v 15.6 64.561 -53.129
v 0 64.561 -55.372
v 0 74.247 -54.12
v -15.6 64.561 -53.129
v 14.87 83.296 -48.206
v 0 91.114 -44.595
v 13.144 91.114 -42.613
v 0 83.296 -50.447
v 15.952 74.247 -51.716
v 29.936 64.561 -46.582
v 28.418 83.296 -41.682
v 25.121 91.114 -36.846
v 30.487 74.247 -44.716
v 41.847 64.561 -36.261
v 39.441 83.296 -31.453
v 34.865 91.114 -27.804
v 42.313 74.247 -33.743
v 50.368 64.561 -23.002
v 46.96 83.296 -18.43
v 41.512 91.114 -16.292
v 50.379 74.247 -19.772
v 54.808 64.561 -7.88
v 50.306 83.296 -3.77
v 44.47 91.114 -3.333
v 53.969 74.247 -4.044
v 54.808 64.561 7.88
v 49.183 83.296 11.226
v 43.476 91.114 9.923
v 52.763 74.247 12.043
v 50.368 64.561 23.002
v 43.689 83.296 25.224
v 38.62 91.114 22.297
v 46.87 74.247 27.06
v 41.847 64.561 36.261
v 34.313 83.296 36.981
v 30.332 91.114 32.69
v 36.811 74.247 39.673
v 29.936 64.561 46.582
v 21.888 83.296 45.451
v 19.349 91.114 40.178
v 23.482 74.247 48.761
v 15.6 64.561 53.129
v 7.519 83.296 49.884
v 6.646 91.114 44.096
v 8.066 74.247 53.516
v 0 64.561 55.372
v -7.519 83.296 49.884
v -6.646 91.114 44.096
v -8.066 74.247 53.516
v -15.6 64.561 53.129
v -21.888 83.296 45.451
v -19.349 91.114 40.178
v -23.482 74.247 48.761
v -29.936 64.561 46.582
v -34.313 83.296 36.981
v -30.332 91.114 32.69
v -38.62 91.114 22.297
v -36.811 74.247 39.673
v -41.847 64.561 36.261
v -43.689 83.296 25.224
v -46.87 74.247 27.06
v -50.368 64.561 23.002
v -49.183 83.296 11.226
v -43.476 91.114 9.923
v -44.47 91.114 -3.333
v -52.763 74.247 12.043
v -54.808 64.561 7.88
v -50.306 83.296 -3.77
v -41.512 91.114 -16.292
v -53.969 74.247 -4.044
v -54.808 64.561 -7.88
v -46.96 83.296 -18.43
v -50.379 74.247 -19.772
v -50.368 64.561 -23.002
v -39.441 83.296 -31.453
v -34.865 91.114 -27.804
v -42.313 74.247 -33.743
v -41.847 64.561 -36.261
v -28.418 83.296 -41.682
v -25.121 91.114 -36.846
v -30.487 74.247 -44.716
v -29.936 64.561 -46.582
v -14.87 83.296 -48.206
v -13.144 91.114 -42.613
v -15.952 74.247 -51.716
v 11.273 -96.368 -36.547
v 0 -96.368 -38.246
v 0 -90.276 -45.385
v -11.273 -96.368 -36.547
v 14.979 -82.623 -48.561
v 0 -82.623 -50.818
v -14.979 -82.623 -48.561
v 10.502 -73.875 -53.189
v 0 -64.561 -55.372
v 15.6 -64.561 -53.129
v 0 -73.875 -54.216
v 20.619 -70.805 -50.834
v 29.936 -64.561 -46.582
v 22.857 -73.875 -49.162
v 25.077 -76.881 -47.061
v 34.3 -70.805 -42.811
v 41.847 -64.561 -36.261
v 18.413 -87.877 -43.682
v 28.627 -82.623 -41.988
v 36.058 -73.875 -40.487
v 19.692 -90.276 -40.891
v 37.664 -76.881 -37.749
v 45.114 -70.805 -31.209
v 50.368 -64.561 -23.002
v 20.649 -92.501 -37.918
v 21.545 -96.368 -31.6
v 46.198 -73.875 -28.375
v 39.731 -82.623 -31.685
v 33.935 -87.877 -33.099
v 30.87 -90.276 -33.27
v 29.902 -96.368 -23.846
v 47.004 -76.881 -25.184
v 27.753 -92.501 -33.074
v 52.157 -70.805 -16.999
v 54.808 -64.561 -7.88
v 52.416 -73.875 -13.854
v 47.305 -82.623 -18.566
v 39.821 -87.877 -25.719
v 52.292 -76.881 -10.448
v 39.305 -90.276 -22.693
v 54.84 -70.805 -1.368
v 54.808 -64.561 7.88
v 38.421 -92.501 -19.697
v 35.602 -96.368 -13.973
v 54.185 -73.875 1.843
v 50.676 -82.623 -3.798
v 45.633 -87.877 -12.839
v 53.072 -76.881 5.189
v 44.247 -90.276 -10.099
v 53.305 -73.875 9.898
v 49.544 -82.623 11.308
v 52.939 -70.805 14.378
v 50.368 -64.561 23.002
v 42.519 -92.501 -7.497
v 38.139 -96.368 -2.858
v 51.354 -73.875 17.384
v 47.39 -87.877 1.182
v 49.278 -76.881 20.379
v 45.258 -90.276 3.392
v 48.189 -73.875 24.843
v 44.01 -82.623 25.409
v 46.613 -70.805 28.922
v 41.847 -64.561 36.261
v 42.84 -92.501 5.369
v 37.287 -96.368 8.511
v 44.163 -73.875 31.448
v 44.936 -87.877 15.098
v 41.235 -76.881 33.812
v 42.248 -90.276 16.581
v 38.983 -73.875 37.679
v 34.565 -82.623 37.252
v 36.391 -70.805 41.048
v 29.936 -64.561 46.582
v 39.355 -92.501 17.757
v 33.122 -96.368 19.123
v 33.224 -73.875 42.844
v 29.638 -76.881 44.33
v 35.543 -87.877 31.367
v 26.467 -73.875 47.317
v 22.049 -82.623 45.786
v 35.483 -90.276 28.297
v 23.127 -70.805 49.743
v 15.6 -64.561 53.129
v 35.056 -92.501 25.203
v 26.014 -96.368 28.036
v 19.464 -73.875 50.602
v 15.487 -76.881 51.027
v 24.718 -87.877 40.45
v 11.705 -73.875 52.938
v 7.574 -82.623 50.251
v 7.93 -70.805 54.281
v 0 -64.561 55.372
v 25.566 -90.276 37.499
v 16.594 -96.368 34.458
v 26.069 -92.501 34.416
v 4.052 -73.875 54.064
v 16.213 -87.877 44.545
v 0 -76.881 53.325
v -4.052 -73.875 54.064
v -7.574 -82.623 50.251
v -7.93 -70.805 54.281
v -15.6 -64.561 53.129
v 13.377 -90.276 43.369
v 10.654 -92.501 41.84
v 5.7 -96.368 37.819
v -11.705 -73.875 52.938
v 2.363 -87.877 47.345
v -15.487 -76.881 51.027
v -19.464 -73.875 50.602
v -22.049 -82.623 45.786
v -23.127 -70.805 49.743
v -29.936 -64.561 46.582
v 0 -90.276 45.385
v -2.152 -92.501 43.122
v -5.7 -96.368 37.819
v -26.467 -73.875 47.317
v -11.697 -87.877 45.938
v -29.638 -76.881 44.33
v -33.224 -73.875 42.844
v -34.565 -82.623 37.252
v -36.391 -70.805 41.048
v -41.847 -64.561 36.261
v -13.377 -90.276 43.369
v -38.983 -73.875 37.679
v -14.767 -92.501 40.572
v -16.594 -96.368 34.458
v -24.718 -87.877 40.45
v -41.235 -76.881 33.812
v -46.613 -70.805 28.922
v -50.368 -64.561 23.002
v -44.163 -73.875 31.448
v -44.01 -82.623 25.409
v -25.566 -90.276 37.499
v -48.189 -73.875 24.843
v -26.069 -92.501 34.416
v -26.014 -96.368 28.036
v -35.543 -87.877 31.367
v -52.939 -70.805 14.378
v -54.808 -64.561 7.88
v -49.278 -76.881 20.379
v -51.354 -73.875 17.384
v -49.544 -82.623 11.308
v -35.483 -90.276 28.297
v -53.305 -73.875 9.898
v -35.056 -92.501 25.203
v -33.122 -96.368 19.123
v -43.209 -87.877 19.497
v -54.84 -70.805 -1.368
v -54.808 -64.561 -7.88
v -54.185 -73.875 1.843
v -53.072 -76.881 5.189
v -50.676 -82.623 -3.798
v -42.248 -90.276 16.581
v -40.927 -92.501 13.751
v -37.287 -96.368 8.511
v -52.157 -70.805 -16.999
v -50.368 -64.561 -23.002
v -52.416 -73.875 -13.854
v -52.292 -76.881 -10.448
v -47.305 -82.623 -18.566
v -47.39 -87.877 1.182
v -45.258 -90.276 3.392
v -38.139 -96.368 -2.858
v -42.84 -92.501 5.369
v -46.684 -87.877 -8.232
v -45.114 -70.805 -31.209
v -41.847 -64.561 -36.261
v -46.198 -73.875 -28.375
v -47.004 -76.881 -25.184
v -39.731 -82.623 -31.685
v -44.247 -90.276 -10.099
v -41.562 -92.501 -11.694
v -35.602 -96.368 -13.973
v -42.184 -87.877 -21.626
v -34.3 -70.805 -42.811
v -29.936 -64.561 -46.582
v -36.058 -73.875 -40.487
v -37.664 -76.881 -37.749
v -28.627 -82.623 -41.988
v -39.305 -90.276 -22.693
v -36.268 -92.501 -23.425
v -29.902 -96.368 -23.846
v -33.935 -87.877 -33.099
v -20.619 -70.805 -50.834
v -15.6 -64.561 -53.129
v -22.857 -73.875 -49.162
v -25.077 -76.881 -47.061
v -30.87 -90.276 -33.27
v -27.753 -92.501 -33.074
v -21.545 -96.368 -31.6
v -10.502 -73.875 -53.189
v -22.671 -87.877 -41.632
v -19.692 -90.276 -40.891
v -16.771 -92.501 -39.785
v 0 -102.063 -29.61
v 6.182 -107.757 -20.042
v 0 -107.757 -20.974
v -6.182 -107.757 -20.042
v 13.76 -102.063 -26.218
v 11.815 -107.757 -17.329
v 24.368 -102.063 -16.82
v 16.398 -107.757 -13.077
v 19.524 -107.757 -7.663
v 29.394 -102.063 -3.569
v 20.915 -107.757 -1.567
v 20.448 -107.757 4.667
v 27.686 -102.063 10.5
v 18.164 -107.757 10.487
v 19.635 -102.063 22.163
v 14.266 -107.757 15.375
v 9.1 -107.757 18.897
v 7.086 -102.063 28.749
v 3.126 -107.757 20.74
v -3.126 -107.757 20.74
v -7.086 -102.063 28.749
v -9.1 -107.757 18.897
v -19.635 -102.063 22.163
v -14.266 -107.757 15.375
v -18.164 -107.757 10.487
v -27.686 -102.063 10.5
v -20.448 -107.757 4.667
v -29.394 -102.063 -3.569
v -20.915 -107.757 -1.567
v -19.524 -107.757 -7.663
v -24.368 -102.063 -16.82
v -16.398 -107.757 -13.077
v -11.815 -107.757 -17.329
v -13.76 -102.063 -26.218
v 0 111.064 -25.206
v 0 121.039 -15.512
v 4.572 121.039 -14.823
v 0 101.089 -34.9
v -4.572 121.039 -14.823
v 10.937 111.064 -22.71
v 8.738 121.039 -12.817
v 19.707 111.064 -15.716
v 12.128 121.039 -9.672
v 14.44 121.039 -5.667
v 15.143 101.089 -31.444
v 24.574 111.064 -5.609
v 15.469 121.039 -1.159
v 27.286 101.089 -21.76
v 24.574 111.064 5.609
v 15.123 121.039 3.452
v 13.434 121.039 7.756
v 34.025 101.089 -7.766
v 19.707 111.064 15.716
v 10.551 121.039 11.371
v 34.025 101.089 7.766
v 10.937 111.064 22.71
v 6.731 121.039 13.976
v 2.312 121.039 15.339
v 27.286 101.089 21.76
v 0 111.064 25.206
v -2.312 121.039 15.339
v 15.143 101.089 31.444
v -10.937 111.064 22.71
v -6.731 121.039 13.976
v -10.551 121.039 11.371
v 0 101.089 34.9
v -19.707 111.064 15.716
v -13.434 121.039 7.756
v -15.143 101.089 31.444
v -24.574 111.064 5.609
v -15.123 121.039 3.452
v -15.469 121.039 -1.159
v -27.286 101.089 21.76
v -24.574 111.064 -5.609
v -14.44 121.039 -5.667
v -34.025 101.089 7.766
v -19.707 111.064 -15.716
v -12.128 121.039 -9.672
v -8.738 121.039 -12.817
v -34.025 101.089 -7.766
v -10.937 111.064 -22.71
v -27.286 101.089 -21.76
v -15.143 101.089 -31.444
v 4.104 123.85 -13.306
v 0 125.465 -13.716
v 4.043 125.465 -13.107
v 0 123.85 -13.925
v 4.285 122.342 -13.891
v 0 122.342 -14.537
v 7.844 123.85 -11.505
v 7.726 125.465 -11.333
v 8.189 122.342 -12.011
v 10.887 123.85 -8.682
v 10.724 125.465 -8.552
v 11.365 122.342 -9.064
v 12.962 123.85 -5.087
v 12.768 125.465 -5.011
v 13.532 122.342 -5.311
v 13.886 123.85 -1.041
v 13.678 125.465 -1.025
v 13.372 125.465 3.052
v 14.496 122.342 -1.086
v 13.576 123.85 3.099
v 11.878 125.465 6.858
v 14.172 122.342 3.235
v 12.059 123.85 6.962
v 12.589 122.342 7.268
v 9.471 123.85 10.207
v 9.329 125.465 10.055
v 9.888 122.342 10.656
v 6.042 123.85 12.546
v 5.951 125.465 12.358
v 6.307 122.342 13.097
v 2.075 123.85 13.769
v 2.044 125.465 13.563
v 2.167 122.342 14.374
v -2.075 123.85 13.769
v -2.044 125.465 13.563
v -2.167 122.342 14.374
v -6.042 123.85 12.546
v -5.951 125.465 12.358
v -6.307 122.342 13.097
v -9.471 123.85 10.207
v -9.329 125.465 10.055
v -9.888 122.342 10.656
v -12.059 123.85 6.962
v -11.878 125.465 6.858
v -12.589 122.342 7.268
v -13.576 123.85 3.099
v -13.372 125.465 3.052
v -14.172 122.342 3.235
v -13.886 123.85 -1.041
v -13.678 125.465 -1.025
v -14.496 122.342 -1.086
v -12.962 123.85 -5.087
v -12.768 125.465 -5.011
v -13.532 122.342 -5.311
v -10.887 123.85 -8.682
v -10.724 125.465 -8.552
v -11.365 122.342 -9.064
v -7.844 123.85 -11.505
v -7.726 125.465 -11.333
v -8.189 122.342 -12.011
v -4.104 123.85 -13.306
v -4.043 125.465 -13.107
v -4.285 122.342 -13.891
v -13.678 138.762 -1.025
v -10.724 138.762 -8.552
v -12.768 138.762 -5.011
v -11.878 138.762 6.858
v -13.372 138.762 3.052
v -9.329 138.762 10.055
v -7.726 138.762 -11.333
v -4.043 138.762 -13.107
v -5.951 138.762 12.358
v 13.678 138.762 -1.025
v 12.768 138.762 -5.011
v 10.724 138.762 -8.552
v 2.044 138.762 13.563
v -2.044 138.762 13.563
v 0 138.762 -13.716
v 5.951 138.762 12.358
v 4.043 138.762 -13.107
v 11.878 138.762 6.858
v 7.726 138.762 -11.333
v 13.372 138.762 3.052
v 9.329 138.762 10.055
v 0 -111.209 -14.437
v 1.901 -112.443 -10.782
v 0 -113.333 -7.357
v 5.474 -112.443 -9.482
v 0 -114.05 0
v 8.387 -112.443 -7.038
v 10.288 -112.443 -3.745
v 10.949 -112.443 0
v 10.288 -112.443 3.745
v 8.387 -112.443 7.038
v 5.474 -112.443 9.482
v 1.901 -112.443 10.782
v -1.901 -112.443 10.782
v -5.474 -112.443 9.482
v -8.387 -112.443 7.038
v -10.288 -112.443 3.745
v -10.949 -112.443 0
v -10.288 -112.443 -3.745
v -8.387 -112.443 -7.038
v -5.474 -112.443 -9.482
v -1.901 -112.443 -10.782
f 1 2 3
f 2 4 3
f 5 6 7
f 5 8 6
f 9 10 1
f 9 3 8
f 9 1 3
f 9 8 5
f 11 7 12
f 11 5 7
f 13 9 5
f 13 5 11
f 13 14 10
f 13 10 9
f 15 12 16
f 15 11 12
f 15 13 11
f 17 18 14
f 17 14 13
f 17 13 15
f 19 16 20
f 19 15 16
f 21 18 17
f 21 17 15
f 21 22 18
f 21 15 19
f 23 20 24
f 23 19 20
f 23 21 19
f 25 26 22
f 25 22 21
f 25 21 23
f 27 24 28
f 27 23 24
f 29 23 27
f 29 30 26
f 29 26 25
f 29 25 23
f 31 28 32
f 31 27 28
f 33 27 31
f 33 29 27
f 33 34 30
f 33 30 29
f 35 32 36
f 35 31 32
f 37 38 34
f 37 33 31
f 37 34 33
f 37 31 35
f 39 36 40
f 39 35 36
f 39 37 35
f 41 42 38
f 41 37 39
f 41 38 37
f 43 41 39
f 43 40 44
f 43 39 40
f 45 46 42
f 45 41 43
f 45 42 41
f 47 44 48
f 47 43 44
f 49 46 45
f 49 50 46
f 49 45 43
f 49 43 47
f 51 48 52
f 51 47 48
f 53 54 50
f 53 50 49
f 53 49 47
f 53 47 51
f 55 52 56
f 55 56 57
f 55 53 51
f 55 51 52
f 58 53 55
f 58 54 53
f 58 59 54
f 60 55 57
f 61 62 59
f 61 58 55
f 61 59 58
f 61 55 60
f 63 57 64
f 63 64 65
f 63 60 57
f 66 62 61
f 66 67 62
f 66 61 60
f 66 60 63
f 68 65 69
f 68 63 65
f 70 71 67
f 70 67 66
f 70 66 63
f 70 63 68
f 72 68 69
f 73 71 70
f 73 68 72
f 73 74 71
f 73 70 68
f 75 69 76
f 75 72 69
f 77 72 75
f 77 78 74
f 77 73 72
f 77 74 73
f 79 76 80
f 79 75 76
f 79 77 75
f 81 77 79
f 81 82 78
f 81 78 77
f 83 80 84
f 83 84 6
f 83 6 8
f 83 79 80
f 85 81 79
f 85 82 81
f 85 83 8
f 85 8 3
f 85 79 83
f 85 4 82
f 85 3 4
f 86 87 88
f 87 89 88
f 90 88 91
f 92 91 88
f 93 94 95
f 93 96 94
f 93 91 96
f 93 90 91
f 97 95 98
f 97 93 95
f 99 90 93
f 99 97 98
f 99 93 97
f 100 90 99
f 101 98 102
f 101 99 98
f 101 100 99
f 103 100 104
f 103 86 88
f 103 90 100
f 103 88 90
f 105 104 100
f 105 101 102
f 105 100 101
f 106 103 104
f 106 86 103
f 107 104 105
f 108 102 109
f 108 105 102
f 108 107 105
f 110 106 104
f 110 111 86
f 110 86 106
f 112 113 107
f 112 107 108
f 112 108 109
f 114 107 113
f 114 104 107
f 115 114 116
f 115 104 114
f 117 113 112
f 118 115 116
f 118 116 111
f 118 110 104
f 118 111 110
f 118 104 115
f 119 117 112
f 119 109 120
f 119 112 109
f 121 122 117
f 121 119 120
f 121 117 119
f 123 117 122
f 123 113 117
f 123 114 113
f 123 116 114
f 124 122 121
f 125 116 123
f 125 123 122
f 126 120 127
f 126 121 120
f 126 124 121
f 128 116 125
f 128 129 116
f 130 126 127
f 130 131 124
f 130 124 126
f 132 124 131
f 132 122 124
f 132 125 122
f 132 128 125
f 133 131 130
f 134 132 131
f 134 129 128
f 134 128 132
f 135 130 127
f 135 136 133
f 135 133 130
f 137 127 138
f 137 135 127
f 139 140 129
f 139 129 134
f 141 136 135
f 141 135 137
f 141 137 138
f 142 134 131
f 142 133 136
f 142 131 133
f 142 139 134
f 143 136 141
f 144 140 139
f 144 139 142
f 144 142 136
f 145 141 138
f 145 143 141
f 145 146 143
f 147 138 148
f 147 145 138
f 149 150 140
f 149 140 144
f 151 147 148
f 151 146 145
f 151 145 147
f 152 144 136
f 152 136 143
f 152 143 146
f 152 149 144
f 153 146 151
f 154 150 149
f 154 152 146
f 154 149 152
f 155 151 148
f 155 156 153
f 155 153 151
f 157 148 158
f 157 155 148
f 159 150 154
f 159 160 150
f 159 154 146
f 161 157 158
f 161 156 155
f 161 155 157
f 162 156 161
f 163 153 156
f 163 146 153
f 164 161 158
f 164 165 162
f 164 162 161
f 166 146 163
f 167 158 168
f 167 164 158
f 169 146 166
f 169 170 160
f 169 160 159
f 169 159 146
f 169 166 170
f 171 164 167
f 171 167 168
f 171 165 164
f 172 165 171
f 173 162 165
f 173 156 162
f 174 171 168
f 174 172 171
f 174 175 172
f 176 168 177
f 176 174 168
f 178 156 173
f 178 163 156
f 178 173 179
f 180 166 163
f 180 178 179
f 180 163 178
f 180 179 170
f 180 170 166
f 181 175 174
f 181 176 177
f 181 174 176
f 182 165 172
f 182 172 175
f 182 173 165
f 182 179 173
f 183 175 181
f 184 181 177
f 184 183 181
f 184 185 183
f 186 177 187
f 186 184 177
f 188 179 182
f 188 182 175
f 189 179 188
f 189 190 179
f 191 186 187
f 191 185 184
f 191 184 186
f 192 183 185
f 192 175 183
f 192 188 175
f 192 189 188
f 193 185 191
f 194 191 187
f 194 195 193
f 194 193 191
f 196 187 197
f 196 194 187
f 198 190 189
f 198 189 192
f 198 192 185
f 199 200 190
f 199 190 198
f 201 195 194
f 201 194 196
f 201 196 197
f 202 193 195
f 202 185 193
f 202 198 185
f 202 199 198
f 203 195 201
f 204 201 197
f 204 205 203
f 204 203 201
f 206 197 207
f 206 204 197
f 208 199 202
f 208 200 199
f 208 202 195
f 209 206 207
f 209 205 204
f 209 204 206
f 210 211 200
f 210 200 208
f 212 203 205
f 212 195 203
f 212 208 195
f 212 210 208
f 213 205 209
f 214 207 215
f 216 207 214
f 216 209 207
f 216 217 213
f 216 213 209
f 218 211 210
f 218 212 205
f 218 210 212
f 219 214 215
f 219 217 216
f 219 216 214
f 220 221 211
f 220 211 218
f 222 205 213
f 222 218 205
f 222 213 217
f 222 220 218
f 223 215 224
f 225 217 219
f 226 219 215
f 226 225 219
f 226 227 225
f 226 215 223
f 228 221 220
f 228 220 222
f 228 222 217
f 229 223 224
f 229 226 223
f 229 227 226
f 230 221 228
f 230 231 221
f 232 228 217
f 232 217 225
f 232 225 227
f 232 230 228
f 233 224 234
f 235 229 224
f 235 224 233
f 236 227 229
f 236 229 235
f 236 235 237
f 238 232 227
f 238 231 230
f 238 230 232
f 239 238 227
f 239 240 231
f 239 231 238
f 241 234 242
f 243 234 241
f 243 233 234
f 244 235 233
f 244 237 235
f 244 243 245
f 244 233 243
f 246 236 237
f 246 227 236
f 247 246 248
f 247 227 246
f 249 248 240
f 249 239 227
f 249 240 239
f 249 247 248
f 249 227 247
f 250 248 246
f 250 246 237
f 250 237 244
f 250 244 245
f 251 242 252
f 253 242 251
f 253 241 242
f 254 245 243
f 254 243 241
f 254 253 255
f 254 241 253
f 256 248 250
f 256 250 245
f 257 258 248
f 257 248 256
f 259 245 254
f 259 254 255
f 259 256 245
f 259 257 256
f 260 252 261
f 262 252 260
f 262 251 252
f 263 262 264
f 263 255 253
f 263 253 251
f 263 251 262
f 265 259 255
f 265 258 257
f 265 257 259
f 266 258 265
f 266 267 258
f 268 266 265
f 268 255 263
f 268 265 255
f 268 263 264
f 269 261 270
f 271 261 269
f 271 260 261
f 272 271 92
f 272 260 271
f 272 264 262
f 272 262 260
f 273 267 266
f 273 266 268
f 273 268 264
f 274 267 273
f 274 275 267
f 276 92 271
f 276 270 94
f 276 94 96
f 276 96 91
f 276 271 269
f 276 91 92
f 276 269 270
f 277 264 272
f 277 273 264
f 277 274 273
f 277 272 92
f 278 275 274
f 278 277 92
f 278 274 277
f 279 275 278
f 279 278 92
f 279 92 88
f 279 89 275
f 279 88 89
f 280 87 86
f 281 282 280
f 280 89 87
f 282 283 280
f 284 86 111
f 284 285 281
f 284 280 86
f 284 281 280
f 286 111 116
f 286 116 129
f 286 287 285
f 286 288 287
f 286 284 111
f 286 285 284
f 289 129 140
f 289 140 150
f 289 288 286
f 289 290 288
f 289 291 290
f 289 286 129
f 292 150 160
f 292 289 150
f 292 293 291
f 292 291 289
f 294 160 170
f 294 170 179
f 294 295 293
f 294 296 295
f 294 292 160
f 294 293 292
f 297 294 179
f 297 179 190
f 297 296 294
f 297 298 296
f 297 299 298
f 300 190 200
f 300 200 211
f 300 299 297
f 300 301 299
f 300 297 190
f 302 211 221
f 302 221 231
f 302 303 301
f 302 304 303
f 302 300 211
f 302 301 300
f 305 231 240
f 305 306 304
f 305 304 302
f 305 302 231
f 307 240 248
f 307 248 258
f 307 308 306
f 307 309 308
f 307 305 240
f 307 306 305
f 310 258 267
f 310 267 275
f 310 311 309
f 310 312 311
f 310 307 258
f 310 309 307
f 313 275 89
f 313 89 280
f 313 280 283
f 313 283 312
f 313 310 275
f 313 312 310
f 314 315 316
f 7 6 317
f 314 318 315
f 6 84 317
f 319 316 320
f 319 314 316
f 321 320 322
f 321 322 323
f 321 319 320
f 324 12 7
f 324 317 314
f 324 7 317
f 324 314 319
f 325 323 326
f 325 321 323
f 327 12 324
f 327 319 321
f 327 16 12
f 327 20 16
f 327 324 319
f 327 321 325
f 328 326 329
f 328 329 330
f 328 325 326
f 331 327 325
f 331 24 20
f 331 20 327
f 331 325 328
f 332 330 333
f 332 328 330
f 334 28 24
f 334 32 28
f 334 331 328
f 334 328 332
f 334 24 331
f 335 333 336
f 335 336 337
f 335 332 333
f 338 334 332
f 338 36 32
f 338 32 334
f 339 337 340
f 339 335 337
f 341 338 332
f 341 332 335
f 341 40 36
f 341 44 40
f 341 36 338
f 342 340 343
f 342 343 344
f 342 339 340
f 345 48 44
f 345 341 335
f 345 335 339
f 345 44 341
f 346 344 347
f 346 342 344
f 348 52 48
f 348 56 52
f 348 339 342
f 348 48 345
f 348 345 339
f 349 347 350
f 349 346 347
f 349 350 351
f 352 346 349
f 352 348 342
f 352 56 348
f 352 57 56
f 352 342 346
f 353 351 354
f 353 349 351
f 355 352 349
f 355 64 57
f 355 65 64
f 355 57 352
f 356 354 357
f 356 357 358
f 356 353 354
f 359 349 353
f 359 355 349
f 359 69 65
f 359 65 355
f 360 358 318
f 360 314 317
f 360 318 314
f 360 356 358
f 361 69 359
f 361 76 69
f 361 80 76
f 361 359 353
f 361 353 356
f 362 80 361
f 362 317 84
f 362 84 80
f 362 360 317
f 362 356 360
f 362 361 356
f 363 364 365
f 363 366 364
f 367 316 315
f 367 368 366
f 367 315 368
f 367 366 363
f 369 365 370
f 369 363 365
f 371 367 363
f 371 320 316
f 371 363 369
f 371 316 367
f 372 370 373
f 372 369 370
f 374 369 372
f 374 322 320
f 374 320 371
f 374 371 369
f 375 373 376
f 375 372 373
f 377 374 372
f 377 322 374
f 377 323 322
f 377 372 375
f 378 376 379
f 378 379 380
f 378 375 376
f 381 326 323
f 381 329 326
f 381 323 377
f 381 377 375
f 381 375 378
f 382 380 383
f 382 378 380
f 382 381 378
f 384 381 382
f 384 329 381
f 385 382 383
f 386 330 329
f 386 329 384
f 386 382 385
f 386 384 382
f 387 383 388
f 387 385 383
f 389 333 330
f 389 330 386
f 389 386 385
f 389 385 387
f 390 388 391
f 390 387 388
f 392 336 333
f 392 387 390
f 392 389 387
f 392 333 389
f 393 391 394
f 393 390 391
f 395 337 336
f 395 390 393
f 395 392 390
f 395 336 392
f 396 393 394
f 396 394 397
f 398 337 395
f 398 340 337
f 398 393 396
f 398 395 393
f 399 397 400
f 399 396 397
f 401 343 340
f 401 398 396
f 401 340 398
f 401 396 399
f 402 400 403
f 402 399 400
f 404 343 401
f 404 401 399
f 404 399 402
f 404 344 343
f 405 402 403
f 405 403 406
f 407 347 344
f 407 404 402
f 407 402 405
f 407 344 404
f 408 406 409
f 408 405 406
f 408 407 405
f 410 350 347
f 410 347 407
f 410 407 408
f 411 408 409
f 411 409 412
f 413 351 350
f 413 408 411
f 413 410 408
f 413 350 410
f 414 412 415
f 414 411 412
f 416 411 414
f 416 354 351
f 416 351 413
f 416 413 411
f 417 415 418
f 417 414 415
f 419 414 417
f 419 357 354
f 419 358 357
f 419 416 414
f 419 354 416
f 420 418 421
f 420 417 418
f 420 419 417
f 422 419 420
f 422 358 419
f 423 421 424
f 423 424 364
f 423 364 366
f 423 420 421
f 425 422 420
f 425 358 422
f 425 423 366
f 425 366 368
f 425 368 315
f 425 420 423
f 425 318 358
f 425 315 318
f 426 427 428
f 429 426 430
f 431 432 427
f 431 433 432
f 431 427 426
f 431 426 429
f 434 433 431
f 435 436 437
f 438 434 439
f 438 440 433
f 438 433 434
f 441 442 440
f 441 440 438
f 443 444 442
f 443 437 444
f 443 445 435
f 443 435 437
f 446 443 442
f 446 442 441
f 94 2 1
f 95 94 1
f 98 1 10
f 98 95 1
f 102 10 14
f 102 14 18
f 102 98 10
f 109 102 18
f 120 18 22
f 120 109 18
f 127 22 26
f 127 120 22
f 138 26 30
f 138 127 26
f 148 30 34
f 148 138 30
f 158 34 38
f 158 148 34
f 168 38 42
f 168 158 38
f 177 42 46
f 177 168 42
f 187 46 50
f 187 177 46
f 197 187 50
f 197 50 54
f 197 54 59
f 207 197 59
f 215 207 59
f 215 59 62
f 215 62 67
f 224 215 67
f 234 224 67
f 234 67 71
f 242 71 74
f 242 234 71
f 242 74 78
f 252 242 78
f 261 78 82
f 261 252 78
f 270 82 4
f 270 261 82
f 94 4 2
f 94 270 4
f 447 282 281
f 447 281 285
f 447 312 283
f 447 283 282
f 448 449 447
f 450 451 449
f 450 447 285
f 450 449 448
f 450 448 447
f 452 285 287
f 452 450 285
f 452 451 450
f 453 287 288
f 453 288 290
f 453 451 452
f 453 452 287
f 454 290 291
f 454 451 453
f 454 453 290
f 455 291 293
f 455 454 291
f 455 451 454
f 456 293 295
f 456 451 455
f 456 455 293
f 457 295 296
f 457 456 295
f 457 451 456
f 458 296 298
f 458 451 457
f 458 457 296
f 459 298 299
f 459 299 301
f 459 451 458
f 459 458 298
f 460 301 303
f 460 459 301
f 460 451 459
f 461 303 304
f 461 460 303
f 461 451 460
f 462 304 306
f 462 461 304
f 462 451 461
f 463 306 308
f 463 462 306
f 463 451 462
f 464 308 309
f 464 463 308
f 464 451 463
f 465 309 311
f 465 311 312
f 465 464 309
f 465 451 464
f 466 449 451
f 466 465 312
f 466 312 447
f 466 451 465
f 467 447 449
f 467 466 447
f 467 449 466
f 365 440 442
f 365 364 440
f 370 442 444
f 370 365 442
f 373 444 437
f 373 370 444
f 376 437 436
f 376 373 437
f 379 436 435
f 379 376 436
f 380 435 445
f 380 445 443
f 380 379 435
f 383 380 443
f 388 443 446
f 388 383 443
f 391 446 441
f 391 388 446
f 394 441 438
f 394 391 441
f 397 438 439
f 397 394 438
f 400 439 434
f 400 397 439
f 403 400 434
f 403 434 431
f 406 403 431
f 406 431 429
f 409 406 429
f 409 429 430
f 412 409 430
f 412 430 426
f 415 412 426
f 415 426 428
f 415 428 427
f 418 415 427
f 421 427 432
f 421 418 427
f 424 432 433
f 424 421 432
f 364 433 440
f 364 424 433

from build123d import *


with BuildPart() as part:
    # Sketch4 → Revolve3 (revolve)
    with BuildSketch(Plane(origin=(0, 0, 0), x_dir=(0, 0, -1), z_dir=(1, 0, 0))):
        with BuildLine():
            Line((55.372, 64.560899101), (55.372, -64.560899101))
            ThreePointArc((55.372, -64.560899101), (50.818345537, -82.623365742), (38.245873957, -96.36823491))
            Line((38.245873957, -96.36823491), (20.973873957, -107.757455094))
            ThreePointArc((20.973873957, -107.757455094), (10.948755767, -112.443060344), (0, -114.050119285))
            Line((0, -114.050119285), (0, 138.762295451))
            Line((0, 138.762295451), (13.716, 138.762295451))
            Line((13.716, 138.762295451), (13.716, 125.464611509))
            ThreePointArc((13.716, 125.464611509), (14.182171321, 123.076503456), (15.512239394, 121.039030831))
            Line((15.512239394, 121.039030831), (44.594563638, 91.114383171))
            ThreePointArc((44.594563638, 91.114383171), (52.574972075, 78.889547422), (55.372, 64.560899101))
        make_face()
    revolve(axis=Axis((0, 138.762295451, 0), (0, -1, 0)))


solid = part.part
